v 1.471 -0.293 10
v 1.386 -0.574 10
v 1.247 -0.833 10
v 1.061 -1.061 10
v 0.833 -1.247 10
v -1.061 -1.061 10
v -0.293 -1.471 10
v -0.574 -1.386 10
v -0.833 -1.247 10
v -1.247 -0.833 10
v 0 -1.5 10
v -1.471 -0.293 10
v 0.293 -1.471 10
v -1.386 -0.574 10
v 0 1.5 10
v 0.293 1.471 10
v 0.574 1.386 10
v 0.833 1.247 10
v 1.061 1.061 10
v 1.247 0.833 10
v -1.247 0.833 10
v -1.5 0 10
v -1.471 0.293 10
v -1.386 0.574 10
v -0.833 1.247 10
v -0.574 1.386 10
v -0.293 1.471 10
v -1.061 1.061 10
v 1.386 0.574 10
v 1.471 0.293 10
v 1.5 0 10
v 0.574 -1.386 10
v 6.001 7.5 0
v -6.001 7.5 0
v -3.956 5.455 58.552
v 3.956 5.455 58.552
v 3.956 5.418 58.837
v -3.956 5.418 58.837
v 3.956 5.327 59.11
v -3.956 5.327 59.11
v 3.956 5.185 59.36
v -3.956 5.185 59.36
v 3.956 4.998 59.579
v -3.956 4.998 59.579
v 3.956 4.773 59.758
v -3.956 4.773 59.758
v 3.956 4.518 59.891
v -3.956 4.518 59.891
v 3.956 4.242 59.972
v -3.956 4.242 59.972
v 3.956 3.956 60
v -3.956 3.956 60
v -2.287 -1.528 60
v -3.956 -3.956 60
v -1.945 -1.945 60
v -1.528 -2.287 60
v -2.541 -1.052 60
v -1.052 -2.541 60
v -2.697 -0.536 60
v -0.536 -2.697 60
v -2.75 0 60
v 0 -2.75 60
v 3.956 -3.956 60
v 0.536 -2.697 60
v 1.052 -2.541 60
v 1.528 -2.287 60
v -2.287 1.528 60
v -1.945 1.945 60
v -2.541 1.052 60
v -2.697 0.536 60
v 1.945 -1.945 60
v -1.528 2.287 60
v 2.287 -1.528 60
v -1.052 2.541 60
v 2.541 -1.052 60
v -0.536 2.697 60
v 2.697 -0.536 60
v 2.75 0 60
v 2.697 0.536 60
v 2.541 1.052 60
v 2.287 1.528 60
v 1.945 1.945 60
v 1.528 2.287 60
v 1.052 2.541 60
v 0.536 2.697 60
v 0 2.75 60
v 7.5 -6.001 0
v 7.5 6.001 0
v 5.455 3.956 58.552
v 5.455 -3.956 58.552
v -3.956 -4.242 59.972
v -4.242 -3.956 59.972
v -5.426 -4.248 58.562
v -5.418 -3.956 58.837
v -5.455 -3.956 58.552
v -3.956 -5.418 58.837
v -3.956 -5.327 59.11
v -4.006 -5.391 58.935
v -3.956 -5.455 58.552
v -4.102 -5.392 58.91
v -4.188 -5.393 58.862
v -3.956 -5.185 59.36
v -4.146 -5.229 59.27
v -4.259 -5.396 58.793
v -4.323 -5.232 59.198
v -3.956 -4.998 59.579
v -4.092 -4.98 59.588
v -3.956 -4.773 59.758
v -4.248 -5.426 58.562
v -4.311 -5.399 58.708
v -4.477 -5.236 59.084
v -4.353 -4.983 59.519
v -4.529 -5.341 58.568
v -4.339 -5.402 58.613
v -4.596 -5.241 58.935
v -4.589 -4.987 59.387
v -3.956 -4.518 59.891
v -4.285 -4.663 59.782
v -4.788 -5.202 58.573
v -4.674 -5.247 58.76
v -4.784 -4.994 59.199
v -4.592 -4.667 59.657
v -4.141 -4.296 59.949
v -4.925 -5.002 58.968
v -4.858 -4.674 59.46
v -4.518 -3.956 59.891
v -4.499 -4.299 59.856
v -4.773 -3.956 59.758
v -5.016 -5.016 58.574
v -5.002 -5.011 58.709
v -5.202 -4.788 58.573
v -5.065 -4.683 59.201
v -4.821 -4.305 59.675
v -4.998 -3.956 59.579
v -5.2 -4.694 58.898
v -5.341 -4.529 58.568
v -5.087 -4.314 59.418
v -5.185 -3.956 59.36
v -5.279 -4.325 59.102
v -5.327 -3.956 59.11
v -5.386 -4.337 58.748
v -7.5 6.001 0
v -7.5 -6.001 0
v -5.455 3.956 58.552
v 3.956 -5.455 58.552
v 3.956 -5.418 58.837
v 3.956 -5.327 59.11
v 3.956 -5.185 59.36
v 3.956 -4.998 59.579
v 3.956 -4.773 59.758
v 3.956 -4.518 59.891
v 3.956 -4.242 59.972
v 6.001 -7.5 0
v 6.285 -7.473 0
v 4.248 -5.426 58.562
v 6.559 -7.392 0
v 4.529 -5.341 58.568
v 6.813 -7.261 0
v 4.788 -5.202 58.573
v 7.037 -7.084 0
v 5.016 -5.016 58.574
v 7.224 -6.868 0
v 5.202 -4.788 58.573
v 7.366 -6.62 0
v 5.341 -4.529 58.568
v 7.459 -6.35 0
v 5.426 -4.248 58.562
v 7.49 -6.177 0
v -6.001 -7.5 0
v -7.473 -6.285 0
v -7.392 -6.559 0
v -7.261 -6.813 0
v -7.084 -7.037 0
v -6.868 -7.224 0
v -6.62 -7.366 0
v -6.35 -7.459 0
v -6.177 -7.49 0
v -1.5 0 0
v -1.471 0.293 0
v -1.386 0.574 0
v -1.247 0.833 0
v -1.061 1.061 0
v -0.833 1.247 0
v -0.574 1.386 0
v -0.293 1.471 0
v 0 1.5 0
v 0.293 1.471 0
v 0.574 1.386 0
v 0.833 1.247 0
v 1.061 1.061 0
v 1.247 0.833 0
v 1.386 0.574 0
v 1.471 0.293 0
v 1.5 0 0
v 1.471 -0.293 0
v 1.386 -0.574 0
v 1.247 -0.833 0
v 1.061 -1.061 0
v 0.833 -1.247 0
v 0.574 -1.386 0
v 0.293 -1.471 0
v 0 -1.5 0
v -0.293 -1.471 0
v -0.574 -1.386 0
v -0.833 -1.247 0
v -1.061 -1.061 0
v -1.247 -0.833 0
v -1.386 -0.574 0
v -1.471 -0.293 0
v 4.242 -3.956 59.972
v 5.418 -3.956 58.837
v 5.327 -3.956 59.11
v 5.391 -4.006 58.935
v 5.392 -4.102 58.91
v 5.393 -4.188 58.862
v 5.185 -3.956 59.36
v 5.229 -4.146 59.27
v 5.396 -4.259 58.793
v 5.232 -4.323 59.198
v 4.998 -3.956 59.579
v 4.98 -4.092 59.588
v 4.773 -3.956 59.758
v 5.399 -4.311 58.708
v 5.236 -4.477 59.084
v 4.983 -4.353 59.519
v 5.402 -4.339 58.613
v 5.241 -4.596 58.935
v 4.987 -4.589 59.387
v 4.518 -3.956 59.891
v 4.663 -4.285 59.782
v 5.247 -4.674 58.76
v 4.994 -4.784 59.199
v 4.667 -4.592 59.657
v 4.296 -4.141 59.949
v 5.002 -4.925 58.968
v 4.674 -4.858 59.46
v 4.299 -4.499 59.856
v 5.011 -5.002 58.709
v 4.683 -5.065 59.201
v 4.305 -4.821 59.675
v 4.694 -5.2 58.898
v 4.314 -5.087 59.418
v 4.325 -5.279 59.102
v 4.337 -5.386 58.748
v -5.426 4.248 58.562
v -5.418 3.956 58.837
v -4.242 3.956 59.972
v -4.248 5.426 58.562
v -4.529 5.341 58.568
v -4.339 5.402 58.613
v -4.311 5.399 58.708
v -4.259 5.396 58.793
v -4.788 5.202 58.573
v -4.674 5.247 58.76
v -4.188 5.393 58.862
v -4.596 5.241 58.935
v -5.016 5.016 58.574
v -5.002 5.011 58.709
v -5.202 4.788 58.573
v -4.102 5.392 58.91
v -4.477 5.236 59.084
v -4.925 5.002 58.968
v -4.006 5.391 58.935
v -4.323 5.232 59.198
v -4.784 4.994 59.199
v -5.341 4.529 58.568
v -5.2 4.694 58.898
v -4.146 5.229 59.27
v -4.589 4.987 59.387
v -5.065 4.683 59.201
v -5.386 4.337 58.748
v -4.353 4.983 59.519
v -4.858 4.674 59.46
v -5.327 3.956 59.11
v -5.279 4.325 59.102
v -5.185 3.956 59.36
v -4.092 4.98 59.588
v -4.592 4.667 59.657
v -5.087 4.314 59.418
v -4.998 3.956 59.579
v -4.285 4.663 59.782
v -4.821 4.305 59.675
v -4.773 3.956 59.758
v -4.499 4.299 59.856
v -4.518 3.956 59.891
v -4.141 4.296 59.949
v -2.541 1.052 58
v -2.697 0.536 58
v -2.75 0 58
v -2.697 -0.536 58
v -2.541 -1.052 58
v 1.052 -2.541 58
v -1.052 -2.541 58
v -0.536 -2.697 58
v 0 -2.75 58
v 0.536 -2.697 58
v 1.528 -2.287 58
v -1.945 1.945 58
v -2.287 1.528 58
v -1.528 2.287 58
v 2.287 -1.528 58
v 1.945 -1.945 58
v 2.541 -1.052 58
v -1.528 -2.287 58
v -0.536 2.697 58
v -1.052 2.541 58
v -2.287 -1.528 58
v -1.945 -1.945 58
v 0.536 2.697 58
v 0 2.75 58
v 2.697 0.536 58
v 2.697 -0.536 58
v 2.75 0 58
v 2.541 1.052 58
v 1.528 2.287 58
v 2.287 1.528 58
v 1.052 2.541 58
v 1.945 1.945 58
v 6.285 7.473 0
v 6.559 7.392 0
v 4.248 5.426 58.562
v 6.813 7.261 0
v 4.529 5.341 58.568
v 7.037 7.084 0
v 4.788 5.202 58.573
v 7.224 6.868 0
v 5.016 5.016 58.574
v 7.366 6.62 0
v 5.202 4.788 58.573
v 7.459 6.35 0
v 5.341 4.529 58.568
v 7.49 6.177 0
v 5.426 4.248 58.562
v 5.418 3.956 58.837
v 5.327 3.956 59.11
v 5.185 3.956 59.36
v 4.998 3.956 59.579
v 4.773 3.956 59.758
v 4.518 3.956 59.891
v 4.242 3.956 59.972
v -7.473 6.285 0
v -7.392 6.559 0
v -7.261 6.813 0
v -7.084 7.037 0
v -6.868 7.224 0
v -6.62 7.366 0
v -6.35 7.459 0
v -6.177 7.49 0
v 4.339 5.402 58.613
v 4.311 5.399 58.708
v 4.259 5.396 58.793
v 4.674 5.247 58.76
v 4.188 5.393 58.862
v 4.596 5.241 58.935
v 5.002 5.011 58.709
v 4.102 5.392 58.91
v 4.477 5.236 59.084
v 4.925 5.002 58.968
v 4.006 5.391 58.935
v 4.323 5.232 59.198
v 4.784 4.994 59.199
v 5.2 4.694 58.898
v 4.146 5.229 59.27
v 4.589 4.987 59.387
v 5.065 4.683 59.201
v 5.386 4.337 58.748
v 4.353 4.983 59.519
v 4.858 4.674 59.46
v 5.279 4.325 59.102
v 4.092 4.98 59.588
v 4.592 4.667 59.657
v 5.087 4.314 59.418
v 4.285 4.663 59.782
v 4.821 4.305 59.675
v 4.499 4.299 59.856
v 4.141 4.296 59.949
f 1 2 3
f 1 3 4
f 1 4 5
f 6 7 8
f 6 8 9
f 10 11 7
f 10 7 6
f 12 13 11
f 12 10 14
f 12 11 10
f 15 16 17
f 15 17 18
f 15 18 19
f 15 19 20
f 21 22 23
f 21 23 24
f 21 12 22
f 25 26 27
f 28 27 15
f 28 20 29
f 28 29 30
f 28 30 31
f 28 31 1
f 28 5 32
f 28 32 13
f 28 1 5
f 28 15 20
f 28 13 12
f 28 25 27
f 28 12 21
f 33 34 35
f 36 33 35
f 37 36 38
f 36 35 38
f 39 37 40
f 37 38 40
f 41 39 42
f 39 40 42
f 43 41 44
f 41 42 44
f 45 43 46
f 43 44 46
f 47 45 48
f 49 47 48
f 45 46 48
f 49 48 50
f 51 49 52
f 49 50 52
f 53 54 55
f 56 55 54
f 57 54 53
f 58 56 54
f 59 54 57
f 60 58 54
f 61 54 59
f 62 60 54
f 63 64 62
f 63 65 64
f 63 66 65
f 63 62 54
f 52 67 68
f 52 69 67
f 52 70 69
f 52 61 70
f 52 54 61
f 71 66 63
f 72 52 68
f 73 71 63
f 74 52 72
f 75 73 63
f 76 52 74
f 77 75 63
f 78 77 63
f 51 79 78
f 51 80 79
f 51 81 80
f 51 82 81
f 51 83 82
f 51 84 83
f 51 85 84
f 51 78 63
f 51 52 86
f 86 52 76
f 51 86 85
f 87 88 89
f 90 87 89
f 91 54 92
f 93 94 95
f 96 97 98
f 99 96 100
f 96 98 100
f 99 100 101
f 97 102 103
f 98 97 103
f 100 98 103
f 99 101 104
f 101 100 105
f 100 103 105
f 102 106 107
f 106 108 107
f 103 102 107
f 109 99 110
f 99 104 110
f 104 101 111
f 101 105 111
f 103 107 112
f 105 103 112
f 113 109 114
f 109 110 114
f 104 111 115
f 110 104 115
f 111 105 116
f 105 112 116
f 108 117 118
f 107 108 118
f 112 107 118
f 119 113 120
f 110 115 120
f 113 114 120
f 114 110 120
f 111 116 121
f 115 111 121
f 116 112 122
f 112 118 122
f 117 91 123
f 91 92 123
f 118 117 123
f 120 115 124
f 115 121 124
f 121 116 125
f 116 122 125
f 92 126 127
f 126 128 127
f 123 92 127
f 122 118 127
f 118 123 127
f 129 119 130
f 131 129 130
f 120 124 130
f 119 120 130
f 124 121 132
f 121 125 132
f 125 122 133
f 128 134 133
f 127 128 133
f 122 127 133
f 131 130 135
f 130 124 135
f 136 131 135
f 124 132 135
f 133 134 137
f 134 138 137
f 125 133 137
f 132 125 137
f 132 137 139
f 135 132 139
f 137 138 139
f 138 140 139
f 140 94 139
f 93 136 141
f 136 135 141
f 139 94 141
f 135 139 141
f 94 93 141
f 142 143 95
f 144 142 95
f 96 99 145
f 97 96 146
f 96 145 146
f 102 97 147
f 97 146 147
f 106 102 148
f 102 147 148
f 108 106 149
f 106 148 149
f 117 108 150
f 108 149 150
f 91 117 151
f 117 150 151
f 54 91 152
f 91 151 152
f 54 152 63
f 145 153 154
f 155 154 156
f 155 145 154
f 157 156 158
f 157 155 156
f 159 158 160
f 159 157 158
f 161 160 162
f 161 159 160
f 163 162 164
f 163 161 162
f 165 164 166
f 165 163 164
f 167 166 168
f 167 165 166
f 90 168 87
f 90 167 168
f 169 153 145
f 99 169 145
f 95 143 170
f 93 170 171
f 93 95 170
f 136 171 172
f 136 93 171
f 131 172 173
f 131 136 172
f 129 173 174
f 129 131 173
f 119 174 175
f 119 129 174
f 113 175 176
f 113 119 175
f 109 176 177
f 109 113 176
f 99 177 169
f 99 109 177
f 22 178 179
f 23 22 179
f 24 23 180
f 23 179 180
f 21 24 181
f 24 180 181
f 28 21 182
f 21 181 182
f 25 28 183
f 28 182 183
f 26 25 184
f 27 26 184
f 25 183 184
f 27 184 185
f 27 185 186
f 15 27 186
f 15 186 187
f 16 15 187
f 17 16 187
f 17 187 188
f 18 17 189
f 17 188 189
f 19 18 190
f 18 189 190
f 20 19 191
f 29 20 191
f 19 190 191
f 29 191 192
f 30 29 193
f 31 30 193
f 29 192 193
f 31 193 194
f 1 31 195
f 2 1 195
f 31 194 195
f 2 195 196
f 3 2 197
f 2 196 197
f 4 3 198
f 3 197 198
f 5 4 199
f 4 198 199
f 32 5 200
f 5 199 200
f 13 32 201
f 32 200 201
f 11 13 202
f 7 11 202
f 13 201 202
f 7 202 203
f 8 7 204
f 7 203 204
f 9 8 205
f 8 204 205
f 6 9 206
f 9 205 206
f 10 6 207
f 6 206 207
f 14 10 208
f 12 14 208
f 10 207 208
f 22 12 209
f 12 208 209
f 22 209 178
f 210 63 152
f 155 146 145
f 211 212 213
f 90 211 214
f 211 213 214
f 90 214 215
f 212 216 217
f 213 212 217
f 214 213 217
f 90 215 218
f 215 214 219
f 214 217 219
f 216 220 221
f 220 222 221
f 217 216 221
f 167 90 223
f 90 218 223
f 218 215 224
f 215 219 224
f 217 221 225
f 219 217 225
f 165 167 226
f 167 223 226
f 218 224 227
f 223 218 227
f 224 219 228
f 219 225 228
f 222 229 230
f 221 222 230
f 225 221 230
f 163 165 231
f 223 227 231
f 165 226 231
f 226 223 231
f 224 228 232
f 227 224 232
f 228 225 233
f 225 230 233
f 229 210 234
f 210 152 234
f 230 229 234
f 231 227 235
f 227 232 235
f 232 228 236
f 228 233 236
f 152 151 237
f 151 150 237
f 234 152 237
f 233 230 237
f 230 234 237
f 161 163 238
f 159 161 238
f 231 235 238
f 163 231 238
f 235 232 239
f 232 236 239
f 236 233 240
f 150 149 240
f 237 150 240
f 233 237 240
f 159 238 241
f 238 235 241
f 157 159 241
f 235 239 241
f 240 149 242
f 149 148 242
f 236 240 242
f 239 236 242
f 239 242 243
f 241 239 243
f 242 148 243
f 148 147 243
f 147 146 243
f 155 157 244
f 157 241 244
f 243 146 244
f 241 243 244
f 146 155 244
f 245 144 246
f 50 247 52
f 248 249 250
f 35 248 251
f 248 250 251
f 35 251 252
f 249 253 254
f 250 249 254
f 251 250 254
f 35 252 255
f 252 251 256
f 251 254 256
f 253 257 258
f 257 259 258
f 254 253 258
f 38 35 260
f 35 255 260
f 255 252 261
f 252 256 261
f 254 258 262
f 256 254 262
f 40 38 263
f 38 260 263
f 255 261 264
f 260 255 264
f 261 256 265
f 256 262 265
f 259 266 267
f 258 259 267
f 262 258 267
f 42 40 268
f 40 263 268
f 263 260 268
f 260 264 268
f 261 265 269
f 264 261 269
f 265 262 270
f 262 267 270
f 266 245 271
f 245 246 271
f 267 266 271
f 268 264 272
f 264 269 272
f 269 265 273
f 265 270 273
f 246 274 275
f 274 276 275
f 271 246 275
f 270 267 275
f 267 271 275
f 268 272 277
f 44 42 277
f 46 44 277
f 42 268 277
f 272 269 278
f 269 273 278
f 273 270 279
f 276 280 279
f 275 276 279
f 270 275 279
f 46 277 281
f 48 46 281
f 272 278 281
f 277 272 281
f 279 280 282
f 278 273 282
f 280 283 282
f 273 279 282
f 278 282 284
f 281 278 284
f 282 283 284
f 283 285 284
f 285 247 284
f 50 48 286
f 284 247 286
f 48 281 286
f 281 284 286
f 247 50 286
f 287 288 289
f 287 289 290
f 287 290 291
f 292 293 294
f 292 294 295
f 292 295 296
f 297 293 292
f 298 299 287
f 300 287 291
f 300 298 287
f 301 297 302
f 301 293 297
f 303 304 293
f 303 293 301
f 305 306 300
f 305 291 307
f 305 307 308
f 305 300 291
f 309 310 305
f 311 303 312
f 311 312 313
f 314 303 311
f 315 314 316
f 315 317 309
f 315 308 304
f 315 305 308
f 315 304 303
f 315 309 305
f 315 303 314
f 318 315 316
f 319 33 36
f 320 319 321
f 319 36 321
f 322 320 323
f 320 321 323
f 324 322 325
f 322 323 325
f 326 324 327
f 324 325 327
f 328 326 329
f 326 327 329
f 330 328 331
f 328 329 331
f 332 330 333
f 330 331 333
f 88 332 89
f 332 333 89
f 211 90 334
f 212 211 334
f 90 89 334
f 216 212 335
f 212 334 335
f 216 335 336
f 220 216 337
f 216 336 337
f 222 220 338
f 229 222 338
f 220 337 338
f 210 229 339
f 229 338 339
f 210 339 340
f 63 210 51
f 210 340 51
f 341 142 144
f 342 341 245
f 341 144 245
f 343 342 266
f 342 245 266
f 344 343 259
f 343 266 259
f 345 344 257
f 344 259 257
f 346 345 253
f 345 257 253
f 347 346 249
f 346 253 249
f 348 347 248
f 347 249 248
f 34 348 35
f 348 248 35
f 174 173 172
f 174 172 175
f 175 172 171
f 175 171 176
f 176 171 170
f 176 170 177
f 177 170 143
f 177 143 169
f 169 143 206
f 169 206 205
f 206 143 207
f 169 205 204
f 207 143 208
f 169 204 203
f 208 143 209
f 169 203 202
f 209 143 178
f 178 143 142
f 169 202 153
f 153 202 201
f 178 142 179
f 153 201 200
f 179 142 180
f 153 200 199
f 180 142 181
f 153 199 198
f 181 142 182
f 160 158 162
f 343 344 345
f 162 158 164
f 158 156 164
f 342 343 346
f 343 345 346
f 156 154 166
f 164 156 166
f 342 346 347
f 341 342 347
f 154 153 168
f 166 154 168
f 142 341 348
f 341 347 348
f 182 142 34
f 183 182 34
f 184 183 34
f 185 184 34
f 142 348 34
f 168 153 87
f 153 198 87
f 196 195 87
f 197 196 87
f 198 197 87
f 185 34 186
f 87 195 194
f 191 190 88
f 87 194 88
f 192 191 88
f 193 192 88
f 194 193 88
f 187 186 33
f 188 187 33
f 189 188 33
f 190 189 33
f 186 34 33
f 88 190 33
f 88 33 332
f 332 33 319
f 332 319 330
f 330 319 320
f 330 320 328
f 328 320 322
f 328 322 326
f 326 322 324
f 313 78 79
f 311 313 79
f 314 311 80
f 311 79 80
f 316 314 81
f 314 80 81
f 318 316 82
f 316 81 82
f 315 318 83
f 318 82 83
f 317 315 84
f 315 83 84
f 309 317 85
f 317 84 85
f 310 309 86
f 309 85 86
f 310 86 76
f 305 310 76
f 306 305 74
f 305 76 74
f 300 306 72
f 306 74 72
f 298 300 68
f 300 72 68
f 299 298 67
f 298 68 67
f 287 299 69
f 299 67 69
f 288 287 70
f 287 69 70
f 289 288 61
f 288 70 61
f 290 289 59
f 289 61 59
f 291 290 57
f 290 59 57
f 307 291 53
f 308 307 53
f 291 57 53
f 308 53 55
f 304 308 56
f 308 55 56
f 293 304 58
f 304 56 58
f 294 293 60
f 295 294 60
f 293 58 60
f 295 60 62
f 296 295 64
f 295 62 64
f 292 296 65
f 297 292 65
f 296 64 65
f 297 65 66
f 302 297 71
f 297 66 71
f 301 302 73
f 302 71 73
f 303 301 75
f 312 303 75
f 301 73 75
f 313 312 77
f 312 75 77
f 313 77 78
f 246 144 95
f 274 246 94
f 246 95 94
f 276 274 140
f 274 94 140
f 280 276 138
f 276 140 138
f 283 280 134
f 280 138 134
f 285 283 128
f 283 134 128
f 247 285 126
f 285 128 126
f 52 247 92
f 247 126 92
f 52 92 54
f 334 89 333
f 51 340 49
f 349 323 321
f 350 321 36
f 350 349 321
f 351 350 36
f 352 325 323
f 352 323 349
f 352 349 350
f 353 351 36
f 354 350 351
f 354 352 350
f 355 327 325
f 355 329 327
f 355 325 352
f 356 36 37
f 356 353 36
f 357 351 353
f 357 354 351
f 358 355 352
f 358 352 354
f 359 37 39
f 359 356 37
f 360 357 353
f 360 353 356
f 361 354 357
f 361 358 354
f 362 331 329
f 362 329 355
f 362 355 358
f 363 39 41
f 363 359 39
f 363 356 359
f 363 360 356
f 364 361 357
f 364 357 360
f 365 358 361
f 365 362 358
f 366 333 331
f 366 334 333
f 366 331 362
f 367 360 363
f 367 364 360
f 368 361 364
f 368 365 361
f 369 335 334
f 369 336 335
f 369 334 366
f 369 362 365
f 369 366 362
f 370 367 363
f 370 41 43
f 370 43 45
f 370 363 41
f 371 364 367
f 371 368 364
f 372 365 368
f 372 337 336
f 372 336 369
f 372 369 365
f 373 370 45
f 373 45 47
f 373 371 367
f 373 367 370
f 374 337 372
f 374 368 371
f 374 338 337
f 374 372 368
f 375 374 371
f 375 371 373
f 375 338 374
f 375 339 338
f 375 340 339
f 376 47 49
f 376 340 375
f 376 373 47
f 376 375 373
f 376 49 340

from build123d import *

# Parameters (mm, degrees)
SKETCH1_W           = 15
SKETCH1_H           = 15
BOSS_EXTRUDE1_DEPTH = 60
BOSS_EXTRUDE1_TAPER = 2
SKETCH2_R           = 1.5
CUT_EXTRUDE1_DEPTH  = 10
SKETCH3_R           = 2.75
CUT_EXTRUDE2_DEPTH  = 2
FILLET1_R           = 1.5


with BuildPart() as part:
    # Sketch1 → Boss-Extrude1 (new body)
    with BuildSketch(Plane.XY):
        Rectangle(SKETCH1_W, SKETCH1_H)
    extrude(amount=BOSS_EXTRUDE1_DEPTH, taper=BOSS_EXTRUDE1_TAPER)

    # Sketch2 → Cut-Extrude1 (cut)
    with BuildSketch(Plane(origin=(0, 0, 0), x_dir=(-1, 0, 0), z_dir=(0, 0, -1))):
        Circle(SKETCH2_R)
    extrude(amount=-CUT_EXTRUDE1_DEPTH, mode=Mode.SUBTRACT)

    # Sketch3 → Cut-Extrude2 (cut)
    with BuildSketch(Plane.XY.offset(60)):
        Circle(SKETCH3_R)
    extrude(amount=-CUT_EXTRUDE2_DEPTH, mode=Mode.SUBTRACT)

    # Fillet1
    fillet1_edges = [part.edges().sort_by_distance(p)[0] for p in [
        (-5.40475383, 0, 60),
        (0, -5.40475383, 60),
        (5.40475383, 0, 60),
        (6.452376915, -6.452376915, 30),
        (-6.452376915, -6.452376915, 30),
        (-6.452376453, 6.452376453, 30.000013228),
        (6.452376915, 6.452376915, 30),
        (0, 5.40475383, 60),
    ]]
    fillet(fillet1_edges, radius=FILLET1_R)


solid = part.part
